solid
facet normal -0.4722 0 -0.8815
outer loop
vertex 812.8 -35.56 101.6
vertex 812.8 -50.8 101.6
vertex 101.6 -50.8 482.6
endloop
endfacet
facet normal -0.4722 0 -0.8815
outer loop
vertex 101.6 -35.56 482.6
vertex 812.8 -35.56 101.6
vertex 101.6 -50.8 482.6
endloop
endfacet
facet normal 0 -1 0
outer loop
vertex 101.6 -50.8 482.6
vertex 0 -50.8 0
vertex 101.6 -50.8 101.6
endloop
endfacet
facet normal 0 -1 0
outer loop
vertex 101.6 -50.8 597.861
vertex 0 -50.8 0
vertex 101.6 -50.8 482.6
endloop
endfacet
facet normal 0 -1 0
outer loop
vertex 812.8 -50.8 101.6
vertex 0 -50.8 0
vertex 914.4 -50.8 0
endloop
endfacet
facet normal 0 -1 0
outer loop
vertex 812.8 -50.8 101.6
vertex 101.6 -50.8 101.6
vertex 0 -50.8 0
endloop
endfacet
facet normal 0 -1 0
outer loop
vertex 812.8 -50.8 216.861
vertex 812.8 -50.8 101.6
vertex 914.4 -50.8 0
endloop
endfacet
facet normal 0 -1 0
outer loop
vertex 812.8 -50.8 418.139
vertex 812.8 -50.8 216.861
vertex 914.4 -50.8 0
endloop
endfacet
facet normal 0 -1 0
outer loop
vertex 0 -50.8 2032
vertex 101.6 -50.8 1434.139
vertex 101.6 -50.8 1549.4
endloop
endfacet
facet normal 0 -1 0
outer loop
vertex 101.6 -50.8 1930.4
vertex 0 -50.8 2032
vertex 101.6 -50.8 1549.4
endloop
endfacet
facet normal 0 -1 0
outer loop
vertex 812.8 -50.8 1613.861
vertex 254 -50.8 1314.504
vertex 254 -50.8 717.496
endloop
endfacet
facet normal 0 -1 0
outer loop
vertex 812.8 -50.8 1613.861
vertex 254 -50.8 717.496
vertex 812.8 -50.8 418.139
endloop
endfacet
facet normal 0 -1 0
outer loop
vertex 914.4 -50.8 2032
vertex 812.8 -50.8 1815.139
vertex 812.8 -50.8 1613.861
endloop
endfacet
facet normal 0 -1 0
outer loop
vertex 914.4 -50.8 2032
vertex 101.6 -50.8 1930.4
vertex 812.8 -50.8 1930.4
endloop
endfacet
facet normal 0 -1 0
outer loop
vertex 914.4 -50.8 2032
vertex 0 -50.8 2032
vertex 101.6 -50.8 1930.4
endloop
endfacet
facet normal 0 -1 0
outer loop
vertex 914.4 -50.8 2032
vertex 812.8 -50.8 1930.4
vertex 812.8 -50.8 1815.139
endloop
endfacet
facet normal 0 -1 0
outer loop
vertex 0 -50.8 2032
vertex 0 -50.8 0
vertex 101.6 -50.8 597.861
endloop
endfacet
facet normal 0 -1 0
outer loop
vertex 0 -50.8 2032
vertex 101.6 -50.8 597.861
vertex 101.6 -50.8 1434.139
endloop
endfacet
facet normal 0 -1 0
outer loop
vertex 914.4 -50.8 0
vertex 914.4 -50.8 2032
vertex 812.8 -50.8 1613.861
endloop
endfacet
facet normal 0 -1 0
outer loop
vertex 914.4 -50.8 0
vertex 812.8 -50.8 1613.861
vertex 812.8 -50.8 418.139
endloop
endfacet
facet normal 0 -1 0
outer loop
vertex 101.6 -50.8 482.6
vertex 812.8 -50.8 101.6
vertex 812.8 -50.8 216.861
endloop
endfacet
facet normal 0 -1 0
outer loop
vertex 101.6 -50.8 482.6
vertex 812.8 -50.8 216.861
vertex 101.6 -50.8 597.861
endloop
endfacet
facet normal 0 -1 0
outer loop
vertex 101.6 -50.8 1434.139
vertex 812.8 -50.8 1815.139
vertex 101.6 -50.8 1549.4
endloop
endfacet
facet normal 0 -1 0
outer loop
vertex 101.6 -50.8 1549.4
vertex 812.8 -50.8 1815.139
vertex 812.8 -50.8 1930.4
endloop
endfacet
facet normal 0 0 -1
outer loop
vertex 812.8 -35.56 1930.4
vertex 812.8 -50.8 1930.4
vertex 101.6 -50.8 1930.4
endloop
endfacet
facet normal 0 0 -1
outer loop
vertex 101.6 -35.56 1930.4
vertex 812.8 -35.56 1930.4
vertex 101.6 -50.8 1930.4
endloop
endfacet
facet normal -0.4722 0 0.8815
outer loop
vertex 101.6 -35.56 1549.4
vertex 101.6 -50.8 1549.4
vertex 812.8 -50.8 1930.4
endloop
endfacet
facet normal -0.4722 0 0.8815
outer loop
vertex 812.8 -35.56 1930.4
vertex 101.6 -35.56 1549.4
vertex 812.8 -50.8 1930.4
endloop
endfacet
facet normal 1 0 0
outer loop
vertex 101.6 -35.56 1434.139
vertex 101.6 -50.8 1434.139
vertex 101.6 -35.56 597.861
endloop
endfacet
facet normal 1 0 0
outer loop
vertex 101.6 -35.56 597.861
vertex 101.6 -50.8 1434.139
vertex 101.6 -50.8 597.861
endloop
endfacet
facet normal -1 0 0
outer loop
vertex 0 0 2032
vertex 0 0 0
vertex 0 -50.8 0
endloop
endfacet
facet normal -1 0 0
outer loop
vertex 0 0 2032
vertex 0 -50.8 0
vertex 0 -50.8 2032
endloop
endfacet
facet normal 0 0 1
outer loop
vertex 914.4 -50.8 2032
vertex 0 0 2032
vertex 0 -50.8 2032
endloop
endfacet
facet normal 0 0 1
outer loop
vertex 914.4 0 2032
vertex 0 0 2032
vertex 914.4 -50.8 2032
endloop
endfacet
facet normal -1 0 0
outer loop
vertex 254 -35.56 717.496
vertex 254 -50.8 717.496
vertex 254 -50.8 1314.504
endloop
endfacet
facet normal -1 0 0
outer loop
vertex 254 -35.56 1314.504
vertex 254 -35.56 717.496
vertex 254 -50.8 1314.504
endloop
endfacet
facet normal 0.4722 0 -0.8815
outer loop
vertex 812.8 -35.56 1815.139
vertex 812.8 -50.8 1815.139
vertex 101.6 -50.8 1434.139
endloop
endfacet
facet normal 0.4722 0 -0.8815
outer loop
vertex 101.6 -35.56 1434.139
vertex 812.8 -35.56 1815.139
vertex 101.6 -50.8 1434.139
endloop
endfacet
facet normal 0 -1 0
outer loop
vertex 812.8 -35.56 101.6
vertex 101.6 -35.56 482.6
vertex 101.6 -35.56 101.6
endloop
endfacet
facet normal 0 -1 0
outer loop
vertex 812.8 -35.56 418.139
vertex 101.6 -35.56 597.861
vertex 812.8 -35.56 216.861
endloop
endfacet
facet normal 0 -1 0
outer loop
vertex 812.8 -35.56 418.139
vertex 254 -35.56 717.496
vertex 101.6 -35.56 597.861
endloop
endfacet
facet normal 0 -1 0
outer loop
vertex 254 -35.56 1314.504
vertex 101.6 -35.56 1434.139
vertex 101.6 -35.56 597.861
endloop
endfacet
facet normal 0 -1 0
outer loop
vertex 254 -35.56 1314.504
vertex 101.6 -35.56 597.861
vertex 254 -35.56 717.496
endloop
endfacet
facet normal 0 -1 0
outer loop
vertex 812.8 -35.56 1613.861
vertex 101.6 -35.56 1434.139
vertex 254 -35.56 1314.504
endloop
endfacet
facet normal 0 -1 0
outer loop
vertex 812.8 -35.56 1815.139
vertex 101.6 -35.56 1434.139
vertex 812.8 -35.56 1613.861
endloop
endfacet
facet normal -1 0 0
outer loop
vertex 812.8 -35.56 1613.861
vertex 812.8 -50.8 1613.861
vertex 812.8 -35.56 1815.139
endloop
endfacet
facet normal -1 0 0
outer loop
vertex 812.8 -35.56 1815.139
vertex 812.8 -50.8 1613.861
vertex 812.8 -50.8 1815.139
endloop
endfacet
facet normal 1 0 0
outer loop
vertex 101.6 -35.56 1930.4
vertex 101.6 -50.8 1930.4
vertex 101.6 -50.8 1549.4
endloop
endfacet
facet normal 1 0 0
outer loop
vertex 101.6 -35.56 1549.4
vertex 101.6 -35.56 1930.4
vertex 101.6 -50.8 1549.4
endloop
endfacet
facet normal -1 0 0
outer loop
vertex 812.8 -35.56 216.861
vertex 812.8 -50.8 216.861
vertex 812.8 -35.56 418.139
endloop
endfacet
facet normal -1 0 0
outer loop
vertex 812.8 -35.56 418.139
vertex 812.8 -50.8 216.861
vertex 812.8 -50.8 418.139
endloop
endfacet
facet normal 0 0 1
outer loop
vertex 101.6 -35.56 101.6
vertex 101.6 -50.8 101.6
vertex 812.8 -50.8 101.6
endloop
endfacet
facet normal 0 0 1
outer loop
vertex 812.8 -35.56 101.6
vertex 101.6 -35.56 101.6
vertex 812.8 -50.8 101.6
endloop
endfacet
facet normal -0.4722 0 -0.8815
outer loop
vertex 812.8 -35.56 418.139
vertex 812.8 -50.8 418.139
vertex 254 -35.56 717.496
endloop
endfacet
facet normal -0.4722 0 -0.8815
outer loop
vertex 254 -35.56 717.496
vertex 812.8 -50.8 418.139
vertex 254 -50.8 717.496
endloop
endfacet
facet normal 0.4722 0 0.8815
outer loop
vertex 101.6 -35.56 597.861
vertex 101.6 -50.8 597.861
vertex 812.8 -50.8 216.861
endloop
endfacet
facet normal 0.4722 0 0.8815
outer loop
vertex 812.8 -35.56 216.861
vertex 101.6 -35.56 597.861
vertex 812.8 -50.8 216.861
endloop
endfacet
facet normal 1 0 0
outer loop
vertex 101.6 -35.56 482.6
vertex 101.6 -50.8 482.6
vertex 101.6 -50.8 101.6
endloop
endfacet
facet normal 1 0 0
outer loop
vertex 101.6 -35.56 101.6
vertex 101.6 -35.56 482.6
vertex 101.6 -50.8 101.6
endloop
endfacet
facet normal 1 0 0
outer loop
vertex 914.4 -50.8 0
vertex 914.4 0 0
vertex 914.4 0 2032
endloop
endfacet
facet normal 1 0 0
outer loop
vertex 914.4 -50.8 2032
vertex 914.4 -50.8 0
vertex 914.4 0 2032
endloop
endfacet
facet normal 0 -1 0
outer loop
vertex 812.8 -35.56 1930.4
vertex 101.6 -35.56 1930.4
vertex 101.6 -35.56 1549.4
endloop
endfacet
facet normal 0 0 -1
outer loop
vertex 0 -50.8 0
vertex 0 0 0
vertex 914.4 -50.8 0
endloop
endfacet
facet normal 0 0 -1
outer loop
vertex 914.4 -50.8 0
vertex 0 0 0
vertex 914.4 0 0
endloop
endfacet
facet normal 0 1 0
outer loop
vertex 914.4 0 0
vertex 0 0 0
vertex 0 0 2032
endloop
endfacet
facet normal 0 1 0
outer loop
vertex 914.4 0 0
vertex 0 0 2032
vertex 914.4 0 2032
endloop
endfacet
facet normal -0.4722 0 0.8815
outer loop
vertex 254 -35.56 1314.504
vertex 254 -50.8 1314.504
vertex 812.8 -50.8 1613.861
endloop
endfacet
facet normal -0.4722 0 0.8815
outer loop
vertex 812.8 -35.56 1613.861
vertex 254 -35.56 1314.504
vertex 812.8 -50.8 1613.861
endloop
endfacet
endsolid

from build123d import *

# Parameters (mm, degrees)
F0_W     = 914.4
F0_H     = 2032
F1_DEPTH = 50.8
F2_W     = 152.4
F2_H     = 433.7214036722
F3_DEPTH = 15.24


with BuildPart() as f1:
    # F0 (on Front) → F1 (new body)
    with BuildSketch(Plane.XZ):
        with Locations((457.2, 1016)):
            Rectangle(F0_W, F0_H)
    extrude(amount=F1_DEPTH)

    # F2 (on face) → F3 (cut)
    with BuildSketch(Plane.XZ.offset(50.8)):
        Polygon((812.8, 1815.1392981639), (101.6, 1434.1392981639), (101.6, 1232.8607018361), (254, 1232.8607018361), (254, 1314.503558979), (812.8, 1613.8607018361), align=None)
        with Locations((177.8, 1016)):
            Rectangle(F2_W, F2_H)
        Polygon((812.8, 1930.4), (101.6, 1930.4), (101.6, 1549.4), align=None)
        Polygon((254, 799.1392981639), (101.6, 799.1392981639), (101.6, 597.8607018361), (812.8, 216.8607018361), (812.8, 418.1392981639), (254, 717.496441021), align=None)
        Polygon((101.6, 101.6), (812.8, 101.6), (101.6, 482.6), align=None)
    extrude(amount=-F3_DEPTH, mode=Mode.SUBTRACT)


solid = f1.part
